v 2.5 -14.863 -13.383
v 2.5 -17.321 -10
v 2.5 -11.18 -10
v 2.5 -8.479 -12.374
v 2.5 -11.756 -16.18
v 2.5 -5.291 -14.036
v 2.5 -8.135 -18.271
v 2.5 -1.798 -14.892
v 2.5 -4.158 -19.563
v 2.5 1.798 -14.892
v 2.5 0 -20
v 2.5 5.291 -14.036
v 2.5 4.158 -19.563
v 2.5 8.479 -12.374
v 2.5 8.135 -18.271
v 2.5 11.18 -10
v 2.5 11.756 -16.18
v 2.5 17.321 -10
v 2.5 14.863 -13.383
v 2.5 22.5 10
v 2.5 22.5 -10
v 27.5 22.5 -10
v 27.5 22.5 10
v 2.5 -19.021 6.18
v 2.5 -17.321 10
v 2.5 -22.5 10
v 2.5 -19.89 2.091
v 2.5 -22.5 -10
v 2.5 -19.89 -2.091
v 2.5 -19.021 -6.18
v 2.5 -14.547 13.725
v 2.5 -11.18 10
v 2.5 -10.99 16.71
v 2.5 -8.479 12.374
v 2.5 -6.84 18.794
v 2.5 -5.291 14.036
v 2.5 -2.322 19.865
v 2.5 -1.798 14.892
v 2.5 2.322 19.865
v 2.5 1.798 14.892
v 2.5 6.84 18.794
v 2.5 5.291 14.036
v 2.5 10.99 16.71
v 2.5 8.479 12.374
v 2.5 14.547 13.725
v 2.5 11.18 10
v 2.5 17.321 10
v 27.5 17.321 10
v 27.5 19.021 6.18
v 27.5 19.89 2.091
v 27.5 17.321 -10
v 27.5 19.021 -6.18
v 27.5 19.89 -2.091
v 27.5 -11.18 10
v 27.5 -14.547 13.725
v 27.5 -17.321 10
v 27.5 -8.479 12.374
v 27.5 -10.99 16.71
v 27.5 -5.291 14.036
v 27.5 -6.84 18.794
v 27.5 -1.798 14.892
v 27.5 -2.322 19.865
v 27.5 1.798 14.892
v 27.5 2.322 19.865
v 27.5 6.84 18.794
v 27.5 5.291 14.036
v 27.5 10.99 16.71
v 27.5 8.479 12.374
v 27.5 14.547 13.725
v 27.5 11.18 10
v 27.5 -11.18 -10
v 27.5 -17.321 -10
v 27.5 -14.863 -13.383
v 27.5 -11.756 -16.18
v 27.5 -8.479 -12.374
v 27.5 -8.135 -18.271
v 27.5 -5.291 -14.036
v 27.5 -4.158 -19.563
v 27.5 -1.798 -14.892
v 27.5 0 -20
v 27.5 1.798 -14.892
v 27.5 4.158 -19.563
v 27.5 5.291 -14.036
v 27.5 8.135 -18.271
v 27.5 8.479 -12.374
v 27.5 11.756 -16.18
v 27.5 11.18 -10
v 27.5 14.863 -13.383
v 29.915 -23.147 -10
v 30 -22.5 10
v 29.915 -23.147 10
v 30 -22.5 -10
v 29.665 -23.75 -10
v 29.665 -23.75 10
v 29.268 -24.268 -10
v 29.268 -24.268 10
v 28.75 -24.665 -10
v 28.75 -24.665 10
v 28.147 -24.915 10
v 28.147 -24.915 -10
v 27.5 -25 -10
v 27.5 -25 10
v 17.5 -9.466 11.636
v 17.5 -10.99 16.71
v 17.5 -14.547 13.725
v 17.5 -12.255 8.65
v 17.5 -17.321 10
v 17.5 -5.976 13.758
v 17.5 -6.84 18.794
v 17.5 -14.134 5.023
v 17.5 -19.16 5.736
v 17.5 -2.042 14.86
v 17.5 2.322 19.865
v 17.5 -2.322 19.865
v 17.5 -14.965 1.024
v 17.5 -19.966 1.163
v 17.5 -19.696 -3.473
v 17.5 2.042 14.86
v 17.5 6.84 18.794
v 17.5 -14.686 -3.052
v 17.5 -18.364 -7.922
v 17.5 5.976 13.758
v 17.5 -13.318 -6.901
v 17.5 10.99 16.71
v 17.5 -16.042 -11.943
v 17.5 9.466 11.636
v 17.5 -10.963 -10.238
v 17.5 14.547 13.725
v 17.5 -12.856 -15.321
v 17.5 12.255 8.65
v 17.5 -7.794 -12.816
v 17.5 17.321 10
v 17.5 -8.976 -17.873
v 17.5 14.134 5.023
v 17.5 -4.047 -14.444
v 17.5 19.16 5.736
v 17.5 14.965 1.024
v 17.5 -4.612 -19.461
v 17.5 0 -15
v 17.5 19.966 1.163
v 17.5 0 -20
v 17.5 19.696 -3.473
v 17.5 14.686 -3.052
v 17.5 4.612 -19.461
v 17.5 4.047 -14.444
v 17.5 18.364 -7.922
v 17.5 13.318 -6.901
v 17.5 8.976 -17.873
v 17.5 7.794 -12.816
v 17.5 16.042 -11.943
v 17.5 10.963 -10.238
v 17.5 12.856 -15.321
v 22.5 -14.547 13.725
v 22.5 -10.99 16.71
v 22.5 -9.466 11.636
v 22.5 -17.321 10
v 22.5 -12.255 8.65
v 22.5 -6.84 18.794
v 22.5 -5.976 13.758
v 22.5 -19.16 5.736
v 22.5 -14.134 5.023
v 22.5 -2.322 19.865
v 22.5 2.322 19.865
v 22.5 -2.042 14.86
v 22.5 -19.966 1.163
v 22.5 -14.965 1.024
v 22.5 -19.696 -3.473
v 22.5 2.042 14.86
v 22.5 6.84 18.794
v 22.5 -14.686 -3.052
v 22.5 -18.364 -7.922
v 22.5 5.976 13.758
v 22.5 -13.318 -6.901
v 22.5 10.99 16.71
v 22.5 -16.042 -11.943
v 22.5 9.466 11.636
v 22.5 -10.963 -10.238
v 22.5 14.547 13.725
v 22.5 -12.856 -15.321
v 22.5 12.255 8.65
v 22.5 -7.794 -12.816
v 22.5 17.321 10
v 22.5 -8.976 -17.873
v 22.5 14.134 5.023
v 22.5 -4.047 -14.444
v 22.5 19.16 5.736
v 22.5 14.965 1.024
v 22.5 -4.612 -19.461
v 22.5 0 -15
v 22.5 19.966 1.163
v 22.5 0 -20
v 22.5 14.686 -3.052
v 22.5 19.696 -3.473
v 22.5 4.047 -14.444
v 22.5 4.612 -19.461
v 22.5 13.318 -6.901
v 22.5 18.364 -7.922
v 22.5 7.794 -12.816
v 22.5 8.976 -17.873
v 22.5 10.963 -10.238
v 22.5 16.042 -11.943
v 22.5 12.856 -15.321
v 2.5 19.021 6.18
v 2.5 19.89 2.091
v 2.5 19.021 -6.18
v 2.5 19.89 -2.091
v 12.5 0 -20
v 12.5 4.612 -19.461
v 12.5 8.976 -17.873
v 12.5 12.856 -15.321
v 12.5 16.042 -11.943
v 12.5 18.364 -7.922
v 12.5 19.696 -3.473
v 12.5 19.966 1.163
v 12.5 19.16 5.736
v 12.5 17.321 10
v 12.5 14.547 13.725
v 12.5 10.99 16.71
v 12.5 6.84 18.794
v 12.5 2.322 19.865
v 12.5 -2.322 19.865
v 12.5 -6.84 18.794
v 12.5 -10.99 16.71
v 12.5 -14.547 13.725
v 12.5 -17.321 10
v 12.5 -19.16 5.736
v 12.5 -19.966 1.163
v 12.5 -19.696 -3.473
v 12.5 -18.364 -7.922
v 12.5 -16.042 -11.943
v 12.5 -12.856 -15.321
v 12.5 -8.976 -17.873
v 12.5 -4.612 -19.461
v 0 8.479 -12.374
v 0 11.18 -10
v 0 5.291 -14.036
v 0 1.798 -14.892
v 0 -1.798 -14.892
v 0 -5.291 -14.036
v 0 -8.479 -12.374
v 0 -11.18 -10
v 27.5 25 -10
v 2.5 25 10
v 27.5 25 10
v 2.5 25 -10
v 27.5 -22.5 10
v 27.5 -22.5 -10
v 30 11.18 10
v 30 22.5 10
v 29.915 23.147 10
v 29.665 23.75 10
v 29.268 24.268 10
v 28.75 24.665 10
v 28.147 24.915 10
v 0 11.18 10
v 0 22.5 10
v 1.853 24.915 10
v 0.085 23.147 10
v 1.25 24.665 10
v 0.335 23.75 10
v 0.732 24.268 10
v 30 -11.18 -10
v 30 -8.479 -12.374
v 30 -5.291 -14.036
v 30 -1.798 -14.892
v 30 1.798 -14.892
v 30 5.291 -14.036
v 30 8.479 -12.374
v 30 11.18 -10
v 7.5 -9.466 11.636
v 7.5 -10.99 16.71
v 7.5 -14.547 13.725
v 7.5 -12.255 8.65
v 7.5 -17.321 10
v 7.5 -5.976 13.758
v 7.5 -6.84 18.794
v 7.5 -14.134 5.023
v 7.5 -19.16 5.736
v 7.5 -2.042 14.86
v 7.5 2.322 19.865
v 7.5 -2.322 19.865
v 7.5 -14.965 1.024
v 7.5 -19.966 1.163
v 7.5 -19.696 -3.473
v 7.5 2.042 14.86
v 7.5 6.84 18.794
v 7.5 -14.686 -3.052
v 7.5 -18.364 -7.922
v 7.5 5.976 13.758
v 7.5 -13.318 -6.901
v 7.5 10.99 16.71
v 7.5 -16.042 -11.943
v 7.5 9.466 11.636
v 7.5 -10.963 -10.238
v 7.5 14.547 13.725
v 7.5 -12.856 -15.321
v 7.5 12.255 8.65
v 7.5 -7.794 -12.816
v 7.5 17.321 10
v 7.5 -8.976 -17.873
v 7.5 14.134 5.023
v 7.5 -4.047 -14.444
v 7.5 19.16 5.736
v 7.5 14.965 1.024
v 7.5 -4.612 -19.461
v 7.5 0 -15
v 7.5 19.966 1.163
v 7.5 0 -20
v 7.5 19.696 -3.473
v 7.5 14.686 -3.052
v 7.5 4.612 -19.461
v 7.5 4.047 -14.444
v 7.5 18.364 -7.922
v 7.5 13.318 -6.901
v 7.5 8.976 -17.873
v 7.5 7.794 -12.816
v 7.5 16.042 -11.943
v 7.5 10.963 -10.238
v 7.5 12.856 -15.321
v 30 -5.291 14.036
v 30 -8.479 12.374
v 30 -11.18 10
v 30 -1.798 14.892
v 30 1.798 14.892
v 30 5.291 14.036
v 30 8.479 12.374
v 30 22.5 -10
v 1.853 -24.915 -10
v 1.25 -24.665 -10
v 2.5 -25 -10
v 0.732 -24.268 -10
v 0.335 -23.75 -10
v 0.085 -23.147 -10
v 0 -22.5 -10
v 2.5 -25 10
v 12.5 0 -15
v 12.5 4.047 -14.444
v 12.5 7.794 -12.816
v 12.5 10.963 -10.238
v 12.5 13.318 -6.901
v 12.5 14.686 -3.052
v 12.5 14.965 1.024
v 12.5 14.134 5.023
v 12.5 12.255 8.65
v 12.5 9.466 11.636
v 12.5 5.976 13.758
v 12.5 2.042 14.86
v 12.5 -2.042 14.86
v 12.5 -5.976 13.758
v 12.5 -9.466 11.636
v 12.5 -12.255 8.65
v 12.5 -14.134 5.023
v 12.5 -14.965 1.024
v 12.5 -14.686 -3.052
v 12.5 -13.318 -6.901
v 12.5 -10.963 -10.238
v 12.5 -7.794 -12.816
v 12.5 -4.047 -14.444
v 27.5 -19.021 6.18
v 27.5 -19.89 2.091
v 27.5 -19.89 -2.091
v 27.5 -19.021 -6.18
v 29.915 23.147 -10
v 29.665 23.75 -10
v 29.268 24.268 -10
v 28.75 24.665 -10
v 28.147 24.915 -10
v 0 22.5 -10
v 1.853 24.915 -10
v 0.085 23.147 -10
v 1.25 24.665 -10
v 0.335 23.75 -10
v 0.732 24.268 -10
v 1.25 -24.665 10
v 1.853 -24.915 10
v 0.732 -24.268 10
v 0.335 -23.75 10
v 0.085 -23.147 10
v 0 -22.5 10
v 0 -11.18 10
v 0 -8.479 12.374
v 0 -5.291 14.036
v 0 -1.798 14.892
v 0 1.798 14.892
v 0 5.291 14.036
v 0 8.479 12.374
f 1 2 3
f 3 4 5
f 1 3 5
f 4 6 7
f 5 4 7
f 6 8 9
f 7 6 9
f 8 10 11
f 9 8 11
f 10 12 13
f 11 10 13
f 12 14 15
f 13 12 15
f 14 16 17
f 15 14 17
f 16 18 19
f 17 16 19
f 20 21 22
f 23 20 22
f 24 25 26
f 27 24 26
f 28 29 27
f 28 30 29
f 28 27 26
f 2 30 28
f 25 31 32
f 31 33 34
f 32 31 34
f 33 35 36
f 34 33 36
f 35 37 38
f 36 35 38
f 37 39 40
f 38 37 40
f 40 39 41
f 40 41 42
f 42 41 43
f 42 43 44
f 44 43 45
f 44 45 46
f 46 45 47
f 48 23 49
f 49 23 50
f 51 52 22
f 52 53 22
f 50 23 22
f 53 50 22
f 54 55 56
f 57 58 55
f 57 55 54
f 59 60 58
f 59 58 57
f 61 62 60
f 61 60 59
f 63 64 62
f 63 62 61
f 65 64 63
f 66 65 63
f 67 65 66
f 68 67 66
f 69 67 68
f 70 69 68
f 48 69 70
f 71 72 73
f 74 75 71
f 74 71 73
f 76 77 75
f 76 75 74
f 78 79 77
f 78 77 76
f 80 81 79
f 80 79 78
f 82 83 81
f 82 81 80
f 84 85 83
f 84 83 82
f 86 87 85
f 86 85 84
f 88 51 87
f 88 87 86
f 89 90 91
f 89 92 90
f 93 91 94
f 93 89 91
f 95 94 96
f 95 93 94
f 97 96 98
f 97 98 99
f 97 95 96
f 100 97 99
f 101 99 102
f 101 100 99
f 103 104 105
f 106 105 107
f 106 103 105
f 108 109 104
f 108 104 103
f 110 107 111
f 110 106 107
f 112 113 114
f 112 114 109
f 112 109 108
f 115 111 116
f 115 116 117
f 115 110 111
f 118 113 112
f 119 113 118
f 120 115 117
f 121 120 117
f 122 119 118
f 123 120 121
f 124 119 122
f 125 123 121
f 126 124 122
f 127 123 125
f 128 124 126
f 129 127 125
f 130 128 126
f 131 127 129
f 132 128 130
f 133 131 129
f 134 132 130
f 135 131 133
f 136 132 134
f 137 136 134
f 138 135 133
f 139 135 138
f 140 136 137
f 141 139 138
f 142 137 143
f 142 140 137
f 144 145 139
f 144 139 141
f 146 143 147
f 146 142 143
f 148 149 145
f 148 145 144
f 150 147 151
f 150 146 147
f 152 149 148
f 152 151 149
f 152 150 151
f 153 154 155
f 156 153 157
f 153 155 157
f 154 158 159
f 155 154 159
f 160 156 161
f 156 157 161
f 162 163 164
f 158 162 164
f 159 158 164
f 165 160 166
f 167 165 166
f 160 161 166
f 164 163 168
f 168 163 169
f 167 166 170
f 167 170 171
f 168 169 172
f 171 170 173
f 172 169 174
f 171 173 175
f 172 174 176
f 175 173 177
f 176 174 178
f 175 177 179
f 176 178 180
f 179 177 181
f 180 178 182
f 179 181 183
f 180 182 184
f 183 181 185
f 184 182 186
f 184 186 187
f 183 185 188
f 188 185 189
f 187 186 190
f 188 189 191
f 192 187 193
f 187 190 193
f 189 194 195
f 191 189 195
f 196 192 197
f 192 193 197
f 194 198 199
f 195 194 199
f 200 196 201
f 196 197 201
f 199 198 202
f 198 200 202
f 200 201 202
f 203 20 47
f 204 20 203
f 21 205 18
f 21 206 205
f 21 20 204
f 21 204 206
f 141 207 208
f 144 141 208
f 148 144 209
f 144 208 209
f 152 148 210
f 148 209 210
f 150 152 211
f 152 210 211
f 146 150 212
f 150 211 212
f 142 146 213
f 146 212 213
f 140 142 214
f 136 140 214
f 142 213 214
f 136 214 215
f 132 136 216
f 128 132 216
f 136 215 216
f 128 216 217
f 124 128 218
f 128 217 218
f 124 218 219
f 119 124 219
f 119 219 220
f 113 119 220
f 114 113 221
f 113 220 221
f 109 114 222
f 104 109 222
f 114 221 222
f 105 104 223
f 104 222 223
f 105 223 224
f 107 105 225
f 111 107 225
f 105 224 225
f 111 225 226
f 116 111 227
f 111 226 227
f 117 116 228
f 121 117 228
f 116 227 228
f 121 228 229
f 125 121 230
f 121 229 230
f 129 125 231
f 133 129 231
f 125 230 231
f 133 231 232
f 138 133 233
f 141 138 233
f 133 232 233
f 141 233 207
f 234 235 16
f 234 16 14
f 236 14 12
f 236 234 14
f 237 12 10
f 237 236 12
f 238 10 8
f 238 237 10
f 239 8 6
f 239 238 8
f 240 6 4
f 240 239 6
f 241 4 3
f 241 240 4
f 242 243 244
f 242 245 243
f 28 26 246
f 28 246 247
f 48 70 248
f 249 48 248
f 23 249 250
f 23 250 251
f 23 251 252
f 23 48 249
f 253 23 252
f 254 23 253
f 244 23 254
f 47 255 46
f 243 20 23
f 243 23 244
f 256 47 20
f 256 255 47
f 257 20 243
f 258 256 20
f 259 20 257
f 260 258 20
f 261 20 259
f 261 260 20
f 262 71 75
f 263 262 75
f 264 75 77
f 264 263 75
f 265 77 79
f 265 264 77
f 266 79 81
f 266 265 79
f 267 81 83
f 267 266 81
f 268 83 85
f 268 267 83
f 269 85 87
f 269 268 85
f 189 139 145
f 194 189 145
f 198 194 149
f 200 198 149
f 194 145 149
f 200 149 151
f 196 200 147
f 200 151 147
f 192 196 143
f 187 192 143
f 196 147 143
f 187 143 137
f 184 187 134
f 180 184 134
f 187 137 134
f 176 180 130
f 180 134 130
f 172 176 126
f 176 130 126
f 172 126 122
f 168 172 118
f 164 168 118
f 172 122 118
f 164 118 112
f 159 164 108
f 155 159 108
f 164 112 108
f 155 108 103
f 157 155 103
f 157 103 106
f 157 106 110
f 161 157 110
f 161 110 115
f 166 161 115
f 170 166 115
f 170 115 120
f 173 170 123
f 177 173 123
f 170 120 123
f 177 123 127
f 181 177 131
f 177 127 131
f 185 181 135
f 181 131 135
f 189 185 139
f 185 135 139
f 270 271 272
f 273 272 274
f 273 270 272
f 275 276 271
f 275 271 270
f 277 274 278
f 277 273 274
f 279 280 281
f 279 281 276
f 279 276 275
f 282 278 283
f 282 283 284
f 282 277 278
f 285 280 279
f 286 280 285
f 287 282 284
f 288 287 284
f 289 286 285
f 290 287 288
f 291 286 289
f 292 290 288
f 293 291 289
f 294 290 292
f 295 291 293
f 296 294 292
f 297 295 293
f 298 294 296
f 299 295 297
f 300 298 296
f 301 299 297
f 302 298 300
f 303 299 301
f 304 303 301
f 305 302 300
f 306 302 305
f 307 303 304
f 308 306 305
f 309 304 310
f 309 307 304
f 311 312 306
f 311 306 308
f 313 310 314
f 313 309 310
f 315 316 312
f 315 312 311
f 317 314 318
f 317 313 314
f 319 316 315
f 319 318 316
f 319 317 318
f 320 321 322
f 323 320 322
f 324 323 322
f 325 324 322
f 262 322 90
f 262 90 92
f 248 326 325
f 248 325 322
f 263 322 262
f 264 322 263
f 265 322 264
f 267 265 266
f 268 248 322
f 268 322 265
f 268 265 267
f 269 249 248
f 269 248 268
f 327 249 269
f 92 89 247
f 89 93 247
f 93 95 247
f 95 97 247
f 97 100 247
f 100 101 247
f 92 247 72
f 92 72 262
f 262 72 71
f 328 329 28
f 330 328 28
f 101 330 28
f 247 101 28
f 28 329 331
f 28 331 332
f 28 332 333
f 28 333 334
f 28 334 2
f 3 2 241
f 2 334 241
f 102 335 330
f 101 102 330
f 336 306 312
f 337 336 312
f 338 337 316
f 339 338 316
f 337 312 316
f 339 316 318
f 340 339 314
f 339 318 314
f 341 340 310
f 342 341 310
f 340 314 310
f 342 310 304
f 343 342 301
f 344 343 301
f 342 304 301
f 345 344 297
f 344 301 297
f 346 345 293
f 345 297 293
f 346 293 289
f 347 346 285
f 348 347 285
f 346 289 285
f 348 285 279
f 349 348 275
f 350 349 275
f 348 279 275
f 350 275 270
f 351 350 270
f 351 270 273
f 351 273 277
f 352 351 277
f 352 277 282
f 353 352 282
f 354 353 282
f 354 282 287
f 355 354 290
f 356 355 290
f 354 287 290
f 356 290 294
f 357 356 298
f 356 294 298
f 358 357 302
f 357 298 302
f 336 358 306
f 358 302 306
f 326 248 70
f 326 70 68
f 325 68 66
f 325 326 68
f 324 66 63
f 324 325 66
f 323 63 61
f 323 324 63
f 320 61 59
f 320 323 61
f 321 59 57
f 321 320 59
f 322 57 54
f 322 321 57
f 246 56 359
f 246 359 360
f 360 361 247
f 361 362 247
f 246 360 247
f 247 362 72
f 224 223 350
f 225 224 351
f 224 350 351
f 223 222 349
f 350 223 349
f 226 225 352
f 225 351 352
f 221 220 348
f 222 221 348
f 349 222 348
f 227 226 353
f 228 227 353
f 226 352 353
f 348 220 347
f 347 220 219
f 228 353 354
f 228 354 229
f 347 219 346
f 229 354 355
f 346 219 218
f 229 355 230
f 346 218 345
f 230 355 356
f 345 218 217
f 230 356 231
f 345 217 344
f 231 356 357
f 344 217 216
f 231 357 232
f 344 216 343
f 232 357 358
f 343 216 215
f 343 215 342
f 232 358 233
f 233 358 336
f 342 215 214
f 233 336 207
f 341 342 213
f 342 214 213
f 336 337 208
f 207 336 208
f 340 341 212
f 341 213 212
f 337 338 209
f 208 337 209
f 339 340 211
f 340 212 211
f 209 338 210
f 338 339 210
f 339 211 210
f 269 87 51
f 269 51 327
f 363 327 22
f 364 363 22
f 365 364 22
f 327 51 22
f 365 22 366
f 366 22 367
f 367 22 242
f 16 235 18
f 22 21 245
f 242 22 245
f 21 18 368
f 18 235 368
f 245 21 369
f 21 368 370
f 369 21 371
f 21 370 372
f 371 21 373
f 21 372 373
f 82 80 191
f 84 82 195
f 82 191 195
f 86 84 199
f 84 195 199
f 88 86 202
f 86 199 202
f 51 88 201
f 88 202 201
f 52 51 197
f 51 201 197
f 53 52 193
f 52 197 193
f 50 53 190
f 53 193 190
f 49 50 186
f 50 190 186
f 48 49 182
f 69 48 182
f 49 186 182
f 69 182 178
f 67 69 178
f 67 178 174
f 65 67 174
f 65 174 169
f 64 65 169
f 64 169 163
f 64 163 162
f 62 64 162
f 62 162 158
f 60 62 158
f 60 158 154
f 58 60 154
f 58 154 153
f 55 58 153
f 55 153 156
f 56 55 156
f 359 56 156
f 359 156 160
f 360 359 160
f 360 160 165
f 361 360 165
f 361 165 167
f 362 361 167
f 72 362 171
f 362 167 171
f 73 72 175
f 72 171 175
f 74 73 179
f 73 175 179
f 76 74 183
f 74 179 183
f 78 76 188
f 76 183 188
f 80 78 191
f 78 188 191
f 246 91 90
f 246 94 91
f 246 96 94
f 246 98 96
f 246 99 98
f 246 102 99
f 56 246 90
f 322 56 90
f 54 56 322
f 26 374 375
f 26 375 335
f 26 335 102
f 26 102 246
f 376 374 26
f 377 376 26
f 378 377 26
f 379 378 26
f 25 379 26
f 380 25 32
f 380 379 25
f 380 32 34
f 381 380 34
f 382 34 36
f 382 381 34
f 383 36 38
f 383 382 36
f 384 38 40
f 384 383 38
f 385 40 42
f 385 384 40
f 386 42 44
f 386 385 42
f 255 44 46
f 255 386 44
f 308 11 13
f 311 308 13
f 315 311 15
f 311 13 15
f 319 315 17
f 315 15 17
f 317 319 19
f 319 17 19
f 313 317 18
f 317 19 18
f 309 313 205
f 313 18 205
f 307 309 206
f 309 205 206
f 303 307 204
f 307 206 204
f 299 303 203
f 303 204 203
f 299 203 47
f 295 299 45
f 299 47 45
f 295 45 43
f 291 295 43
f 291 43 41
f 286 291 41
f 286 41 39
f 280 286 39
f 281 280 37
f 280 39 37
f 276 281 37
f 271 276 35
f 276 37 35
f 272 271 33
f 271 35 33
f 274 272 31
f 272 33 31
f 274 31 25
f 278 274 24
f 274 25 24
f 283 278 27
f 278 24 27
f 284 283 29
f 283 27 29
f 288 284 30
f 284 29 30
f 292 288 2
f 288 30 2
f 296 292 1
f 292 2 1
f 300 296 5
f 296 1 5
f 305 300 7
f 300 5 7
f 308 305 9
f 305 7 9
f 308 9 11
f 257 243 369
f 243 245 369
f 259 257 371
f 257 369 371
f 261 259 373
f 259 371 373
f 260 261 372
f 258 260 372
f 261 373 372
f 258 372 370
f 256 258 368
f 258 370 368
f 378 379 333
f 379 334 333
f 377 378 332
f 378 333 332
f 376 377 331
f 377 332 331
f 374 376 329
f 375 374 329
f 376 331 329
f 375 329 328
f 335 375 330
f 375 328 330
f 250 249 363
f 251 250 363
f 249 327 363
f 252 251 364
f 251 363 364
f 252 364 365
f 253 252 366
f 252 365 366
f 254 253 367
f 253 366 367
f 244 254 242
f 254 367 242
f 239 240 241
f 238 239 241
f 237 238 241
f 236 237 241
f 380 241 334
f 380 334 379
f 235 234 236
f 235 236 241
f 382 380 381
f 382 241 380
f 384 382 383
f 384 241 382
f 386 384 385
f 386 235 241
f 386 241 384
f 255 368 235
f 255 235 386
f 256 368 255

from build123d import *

# Parameters (mm, degrees)
SKETCH1_W            = 20
SKETCH1_H            = 47.5
BOSS_EXTRUDE1_DEPTH  = 2.5
SKETCH2_R            = 20
BOSS_EXTRUDE2_DEPTH  = 5
SKETCH3_R            = 15
BOSS_EXTRUDE3_DEPTH  = 5
SKETCH4_R            = 20
BOSS_EXTRUDE4_DEPTH  = 5
SKETCH5_R            = 15
BOSS_EXTRUDE5_DEPTH  = 5
SKETCH6_R            = 20
BOSS_EXTRUDE6_DEPTH  = 5
BOSS_EXTRUDE7_DEPTH  = 2.5
SKETCH8_W            = 30
SKETCH8_H            = 20
BOSS_EXTRUDE8_DEPTH  = 2.5
SKETCH10_W           = 20
SKETCH10_H           = 2.5
BOSS_EXTRUDE9_DEPTH  = 25
SKETCH11_R           = 15
BOSS_EXTRUDE10_DEPTH = 2.5
SKETCH12_R           = 15
BOSS_EXTRUDE11_DEPTH = 2.5
FILLET1_R            = 2.5
FILLET2_R            = 2.5


with BuildPart() as part:
    # Sketch1 → Boss-Extrude1 (new body)
    with BuildSketch(Plane(origin=(0, 0, 0), x_dir=(0, 0, -1), z_dir=(1, 0, 0))):
        with Locations((0, -1.25)):
            Rectangle(SKETCH1_W, SKETCH1_H)
    extrude(amount=BOSS_EXTRUDE1_DEPTH)

    # Sketch2 → Boss-Extrude2 (add)
    with BuildSketch(Plane(origin=(2.5, 0, 0), x_dir=(0, 0, -1), z_dir=(1, 0, 0))):
        Circle(SKETCH2_R)
    extrude(amount=BOSS_EXTRUDE2_DEPTH)

    # Sketch3 → Boss-Extrude3 (add)
    with BuildSketch(Plane(origin=(7.5, 0, 0), x_dir=(0, 0, -1), z_dir=(1, 0, 0))):
        Circle(SKETCH3_R)
    extrude(amount=BOSS_EXTRUDE3_DEPTH)

    # Sketch4 → Boss-Extrude4 (add)
    with BuildSketch(Plane(origin=(12.5, 0, 0), x_dir=(0, 0, -1), z_dir=(1, 0, 0))):
        Circle(SKETCH4_R)
    extrude(amount=BOSS_EXTRUDE4_DEPTH)

    # Sketch5 → Boss-Extrude5 (add)
    with BuildSketch(Plane(origin=(17.5, 0, 0), x_dir=(0, 0, -1), z_dir=(1, 0, 0))):
        Circle(SKETCH5_R)
    extrude(amount=BOSS_EXTRUDE5_DEPTH)

    # Sketch6 → Boss-Extrude6 (add)
    with BuildSketch(Plane(origin=(22.5, 0, 0), x_dir=(0, 0, -1), z_dir=(1, 0, 0))):
        Circle(SKETCH6_R)
    extrude(amount=BOSS_EXTRUDE6_DEPTH)

    # Sketch7 → Boss-Extrude7 (add)
    with BuildSketch(Plane(origin=(27.5, 0, 0), x_dir=(0, 0, -1), z_dir=(1, 0, 0))):
        Polygon((-10, -22.5), (-10, -25), (10, -25), (10, -22.5), (10, 22.5), (-10, 22.5), align=None)
    extrude(amount=BOSS_EXTRUDE7_DEPTH)

    # Sketch8 → Boss-Extrude8 (add)
    with BuildSketch(Plane(origin=(0, 22.5, 0), x_dir=(1, 0, 0), z_dir=(0, 1, 0))):
        with Locations((15, 0)):
            Rectangle(SKETCH8_W, SKETCH8_H)
    extrude(amount=BOSS_EXTRUDE8_DEPTH)

    # Sketch10 → Boss-Extrude9 (add)
    with BuildSketch(Plane(origin=(2.5, 0, 0), x_dir=(0, 0, -1), z_dir=(1, 0, 0))):
        with Locations((0, -23.75)):
            Rectangle(SKETCH10_W, SKETCH10_H)
    extrude(amount=BOSS_EXTRUDE9_DEPTH)

    # Sketch11 → Boss-Extrude10 (add)
    with BuildSketch(Plane(origin=(30, 0, 0), x_dir=(0, 0, -1), z_dir=(1, 0, 0))):
        Circle(SKETCH11_R)
    extrude(amount=-BOSS_EXTRUDE10_DEPTH)

    # Sketch12 → Boss-Extrude11 (add)
    with BuildSketch(Plane.ZY):
        Circle(SKETCH12_R)
    extrude(amount=-BOSS_EXTRUDE11_DEPTH)

    # Fillet1
    fillet1_edges = [part.edges().sort_by_distance(p)[0] for p in [
        (0, 25, 0),
        (30, 25, 0),
    ]]
    fillet(fillet1_edges, radius=FILLET1_R)

    # Fillet2
    fillet2_edges = [part.edges().sort_by_distance(p)[0] for p in [
        (30, -25, 0),
        (0, -25, 0),
    ]]
    fillet(fillet2_edges, radius=FILLET2_R)


solid = part.part
